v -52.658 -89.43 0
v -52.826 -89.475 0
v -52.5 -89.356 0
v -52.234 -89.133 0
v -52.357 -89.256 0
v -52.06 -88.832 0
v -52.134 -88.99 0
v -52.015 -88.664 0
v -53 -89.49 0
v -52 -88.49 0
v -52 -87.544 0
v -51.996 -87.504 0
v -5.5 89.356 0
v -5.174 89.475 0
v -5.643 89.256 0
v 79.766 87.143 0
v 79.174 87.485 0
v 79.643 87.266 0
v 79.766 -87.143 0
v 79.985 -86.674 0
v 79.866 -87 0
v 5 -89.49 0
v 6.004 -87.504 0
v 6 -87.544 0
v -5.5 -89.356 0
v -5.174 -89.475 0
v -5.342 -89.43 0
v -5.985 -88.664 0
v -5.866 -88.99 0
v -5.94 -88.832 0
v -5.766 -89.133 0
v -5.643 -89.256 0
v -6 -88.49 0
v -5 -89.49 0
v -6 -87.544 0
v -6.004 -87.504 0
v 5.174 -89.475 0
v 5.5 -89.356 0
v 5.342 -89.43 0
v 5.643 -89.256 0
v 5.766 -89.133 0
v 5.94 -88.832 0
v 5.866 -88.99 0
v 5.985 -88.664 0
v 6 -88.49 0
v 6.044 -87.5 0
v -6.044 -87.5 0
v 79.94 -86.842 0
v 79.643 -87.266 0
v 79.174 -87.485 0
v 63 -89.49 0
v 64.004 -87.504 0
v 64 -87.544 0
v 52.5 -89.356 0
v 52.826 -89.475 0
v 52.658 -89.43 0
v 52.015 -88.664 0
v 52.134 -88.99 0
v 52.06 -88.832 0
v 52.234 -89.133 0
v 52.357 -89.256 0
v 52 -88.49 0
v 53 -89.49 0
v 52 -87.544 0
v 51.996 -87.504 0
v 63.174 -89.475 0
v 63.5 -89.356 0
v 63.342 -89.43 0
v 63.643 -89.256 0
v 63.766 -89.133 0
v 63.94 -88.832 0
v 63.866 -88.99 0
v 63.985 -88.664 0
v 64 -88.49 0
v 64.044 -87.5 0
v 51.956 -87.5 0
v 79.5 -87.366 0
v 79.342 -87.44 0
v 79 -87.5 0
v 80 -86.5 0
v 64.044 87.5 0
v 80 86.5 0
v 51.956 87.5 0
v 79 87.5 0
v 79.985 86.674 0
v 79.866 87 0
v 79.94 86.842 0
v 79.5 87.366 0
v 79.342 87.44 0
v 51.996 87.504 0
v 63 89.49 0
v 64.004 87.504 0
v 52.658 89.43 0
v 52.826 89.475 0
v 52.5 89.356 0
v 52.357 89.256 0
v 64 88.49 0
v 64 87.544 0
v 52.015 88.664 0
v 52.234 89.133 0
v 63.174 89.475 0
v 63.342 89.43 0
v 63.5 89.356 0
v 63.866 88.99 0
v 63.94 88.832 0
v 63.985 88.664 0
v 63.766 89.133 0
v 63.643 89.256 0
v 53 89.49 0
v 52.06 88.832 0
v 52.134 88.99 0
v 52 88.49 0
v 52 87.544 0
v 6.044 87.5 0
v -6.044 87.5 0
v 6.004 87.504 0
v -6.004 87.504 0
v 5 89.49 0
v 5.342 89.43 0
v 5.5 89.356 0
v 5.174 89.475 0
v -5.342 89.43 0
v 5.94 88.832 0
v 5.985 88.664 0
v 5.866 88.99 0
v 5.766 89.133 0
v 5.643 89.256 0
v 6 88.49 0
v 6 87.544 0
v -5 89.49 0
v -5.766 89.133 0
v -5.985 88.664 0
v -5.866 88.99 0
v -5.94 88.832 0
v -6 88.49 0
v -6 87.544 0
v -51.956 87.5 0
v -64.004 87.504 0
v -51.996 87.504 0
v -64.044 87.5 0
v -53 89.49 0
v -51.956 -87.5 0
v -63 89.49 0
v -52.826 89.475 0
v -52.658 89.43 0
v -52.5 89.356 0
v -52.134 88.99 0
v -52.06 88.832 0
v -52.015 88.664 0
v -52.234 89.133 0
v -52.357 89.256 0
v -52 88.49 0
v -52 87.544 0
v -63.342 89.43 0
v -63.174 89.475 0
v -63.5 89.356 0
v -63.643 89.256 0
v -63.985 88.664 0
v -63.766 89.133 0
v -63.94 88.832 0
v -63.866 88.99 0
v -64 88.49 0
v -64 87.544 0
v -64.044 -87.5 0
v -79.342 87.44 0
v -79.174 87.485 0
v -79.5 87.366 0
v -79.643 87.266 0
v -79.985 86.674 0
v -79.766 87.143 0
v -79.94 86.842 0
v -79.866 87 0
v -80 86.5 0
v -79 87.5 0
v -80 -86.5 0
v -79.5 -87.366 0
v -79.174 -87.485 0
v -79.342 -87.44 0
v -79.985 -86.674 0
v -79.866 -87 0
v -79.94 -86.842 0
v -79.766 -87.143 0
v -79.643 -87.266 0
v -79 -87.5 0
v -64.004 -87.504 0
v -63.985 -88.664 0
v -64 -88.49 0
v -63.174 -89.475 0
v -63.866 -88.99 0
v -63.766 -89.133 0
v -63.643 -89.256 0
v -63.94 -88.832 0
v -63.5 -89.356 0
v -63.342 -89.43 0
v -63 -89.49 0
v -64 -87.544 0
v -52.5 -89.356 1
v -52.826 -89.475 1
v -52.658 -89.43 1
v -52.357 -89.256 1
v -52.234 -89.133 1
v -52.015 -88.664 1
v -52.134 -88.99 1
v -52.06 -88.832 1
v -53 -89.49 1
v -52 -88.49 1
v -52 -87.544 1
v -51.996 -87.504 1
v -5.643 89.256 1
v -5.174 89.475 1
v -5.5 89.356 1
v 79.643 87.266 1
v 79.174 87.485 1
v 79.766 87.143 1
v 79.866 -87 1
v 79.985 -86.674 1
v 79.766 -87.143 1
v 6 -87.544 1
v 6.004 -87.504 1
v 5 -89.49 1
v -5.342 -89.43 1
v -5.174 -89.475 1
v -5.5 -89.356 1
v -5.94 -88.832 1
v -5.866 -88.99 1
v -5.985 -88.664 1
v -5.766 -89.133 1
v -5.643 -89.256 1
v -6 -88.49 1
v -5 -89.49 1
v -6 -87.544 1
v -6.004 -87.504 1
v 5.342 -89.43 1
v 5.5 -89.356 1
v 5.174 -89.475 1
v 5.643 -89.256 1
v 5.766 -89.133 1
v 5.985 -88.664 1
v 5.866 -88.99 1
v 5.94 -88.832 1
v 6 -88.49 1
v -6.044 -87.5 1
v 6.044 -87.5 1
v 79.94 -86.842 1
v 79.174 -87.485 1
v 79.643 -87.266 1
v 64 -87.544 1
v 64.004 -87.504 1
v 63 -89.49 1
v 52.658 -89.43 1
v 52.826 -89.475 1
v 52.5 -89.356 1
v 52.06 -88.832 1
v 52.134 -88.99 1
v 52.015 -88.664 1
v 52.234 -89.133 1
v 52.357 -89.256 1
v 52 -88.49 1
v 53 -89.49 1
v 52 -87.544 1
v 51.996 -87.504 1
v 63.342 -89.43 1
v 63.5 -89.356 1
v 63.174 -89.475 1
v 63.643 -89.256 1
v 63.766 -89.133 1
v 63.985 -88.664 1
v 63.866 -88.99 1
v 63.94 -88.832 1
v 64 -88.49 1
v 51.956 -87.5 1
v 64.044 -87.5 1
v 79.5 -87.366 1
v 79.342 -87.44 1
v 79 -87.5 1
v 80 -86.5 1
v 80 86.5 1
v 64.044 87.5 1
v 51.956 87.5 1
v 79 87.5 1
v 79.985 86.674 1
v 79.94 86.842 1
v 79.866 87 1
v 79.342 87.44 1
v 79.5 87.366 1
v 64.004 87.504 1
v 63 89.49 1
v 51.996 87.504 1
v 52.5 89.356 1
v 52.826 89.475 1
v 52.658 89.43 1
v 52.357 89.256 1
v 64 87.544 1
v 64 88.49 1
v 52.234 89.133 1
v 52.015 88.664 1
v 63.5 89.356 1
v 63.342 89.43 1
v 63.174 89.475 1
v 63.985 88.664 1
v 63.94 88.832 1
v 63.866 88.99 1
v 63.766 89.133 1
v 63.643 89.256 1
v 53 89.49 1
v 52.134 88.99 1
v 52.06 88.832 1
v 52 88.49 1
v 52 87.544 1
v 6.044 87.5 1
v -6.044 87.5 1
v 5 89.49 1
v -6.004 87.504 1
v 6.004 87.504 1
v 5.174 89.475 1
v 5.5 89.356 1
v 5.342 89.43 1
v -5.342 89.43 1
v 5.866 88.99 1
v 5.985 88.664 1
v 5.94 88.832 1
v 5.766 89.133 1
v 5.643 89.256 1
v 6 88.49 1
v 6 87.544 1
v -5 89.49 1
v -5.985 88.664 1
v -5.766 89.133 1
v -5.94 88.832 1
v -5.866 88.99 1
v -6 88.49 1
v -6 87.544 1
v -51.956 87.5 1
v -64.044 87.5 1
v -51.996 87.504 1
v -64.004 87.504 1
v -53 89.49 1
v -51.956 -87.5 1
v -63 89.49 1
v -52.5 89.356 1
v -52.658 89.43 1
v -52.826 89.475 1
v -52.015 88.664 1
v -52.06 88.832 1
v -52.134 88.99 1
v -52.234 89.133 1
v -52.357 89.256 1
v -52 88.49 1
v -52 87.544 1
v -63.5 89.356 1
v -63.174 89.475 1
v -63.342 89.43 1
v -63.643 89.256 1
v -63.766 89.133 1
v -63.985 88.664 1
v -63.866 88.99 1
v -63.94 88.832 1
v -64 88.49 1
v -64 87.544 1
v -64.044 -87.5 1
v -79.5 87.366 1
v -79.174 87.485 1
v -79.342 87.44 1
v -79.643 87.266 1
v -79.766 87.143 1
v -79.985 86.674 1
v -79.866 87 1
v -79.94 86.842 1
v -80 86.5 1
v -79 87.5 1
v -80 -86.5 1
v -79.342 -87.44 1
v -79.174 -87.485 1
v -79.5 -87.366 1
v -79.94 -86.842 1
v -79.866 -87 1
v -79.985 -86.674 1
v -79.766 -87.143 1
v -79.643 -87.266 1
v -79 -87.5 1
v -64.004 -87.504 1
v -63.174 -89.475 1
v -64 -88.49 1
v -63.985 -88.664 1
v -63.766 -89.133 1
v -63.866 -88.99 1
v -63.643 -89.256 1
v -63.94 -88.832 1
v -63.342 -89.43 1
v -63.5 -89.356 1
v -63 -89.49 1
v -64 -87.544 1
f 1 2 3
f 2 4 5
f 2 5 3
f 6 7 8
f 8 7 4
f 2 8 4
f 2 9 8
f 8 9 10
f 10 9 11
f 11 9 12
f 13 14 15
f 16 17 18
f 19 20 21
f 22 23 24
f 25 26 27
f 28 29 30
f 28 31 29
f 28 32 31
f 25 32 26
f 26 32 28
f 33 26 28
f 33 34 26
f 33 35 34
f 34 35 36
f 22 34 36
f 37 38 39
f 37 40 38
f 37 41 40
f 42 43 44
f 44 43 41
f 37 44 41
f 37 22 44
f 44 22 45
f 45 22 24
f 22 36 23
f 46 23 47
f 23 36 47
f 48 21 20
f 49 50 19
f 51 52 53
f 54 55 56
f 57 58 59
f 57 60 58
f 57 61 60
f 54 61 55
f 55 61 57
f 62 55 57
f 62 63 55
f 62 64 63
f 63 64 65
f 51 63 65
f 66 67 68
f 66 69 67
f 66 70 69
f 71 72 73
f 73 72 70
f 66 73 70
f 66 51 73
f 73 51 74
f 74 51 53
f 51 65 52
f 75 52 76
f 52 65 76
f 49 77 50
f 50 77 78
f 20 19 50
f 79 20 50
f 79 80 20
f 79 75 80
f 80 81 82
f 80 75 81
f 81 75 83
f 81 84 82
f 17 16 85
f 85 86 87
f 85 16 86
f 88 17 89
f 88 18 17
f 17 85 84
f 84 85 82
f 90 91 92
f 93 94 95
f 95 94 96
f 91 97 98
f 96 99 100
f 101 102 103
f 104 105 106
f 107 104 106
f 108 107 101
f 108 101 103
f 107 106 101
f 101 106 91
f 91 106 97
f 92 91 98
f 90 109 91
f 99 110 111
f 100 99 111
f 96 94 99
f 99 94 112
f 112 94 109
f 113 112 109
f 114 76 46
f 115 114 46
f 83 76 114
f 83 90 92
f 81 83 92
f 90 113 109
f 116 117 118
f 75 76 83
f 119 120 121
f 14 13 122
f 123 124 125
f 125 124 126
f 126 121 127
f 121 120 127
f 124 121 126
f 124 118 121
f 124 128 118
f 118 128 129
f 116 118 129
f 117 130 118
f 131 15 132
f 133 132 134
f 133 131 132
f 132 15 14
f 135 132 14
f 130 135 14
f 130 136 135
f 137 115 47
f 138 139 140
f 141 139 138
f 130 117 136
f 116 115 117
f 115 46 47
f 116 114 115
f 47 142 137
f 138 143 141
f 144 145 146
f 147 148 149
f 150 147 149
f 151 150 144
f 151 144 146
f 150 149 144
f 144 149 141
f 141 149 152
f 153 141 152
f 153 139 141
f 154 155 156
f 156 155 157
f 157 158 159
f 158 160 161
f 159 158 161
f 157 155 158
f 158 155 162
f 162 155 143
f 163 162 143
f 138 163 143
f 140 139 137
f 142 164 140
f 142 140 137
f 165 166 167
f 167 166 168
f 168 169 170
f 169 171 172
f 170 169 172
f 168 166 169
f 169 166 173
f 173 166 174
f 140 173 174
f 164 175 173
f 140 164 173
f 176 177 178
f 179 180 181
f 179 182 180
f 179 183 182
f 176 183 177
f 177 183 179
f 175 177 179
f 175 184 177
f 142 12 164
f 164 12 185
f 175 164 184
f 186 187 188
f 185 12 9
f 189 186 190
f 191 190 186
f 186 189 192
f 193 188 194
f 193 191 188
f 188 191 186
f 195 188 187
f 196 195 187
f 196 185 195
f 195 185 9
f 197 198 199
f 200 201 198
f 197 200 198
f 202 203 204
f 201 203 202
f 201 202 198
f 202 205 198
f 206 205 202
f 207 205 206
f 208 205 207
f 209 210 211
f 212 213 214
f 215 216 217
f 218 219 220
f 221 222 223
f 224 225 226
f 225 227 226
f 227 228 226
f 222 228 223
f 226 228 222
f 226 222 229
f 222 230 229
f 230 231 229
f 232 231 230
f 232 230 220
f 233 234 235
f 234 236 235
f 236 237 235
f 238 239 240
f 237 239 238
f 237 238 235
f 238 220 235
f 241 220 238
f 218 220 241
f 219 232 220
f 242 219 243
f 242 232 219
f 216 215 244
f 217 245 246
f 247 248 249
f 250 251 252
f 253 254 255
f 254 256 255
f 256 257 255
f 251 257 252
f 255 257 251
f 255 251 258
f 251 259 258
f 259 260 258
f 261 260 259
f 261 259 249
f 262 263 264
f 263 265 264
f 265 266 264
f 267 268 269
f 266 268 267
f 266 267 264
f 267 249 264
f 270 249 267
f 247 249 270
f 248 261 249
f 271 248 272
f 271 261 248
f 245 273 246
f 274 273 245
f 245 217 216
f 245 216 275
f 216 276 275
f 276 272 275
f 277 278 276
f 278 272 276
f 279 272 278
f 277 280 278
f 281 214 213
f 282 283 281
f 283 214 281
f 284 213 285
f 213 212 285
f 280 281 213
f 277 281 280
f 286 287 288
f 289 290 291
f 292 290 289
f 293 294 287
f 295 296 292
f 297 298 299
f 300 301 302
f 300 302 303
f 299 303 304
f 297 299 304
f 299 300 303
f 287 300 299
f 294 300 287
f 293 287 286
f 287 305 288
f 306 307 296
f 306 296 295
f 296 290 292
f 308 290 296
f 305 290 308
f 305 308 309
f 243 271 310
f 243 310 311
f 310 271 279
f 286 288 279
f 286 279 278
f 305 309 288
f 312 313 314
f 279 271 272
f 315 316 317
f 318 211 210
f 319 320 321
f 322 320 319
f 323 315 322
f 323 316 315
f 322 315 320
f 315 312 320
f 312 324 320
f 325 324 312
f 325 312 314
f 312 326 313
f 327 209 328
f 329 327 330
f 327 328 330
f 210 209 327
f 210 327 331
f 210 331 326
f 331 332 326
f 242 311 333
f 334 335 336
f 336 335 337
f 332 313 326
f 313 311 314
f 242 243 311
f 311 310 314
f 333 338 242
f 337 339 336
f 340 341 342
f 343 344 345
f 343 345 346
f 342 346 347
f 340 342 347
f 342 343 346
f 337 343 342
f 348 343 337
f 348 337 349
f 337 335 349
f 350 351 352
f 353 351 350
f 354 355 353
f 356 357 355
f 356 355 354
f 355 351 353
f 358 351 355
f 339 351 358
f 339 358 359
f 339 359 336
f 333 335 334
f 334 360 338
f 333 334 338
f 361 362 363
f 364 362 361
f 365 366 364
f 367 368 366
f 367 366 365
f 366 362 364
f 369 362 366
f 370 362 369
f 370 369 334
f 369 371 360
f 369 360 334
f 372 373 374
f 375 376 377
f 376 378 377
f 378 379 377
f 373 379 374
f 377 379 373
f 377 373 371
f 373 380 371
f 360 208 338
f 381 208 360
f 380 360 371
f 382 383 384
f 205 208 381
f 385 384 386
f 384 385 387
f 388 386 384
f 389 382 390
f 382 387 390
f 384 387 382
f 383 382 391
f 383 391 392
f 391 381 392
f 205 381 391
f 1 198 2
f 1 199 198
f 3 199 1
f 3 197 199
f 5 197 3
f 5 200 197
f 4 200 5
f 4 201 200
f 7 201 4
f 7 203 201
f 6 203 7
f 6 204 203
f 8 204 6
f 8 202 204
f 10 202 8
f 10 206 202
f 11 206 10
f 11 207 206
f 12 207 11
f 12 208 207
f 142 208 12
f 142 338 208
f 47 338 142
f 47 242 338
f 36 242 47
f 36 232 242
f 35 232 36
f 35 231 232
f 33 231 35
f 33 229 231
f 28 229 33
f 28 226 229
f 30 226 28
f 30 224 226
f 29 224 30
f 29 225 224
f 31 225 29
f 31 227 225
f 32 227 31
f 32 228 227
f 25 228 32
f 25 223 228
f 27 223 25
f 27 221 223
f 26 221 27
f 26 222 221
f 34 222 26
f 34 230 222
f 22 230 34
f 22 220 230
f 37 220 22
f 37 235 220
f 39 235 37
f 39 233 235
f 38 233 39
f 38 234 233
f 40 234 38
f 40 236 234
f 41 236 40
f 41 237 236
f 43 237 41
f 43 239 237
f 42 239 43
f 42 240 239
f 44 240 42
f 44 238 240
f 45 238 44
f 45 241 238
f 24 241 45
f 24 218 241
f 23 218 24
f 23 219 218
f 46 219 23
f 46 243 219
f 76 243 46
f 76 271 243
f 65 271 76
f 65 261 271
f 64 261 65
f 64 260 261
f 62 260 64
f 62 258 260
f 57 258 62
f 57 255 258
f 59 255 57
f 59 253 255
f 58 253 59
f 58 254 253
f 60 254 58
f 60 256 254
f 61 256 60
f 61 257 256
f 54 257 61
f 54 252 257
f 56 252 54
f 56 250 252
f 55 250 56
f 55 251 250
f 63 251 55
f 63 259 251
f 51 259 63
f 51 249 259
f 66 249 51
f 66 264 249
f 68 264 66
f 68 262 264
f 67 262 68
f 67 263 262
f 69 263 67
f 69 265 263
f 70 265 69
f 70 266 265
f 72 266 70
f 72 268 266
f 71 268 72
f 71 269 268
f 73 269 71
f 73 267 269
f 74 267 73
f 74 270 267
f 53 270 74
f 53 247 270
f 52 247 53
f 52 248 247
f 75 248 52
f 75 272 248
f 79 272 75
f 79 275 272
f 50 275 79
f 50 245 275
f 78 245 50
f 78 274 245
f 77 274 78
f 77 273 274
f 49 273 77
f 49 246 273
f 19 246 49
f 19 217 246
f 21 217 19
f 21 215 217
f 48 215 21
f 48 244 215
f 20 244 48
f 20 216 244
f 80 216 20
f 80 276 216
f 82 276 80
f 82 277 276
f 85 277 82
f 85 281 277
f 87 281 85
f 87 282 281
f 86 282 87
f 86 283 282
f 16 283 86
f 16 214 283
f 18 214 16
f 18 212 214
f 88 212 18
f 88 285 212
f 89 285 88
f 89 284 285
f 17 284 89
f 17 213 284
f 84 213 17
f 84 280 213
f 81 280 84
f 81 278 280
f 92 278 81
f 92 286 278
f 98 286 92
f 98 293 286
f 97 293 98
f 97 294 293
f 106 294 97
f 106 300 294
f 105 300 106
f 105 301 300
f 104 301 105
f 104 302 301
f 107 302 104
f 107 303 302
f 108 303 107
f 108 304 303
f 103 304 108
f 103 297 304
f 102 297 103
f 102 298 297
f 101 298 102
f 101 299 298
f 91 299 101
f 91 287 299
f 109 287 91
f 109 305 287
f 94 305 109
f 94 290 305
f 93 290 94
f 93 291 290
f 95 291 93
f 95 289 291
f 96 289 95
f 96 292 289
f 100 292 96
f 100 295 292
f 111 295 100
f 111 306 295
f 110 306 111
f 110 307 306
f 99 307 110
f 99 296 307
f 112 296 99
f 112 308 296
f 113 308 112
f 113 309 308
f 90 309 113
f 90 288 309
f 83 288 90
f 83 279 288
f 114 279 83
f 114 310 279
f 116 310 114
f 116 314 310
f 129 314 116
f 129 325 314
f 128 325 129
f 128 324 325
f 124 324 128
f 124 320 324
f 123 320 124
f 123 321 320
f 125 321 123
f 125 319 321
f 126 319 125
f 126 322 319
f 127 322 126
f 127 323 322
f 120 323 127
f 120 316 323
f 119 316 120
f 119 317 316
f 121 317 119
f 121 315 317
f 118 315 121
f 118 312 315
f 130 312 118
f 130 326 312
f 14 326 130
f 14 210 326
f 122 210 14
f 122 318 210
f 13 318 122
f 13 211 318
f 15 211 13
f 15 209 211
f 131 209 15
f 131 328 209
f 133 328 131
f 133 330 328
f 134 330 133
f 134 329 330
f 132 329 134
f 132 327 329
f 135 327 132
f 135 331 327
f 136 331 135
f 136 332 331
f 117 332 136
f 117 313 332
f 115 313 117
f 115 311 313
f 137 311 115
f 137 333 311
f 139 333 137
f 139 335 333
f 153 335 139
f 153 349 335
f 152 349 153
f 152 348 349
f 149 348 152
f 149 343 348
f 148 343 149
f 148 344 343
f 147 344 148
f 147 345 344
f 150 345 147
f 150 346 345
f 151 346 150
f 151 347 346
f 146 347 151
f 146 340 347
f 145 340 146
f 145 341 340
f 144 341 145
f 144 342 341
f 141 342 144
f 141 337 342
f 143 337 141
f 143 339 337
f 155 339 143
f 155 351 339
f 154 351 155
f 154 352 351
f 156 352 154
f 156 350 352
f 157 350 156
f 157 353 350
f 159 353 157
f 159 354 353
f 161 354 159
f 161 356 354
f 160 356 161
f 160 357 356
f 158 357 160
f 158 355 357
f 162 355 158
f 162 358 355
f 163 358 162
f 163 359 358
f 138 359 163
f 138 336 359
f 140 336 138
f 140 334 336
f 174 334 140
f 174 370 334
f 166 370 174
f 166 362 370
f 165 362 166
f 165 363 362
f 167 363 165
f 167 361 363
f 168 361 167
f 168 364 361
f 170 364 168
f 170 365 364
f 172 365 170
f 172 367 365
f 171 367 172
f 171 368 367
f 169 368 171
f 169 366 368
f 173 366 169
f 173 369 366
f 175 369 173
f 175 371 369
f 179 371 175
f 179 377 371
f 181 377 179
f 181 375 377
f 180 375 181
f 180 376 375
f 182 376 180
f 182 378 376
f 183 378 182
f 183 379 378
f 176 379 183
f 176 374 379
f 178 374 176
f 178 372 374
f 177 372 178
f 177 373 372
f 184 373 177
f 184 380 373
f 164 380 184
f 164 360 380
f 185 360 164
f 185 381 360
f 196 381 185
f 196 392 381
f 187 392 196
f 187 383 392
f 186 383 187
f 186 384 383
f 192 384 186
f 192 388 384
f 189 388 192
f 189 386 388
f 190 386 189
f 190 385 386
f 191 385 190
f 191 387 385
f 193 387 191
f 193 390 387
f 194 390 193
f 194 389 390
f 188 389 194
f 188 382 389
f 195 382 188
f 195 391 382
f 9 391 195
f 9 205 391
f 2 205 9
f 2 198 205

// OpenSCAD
E = 0.01;

width = 160;
height = 175;
thickness = 1;

tab_width = 12;
tab_height = 2;
tab_gap = 52;

module shape_tab() {
    square([tab_width, tab_height], center = true);
}

module shape() {
    square([width, height], center = true);

    translate([0, tab_height / 2 + height / 2 - E]) {
        shape_tab();

        translate([tab_width / 2 + tab_gap, 0])
            shape_tab();

        translate([- tab_width / 2 - tab_gap, 0])
            shape_tab();
    }

    translate([0, - tab_height / 2 - height / 2 + E]) {
        shape_tab();

        translate([tab_width / 2 + tab_gap, 0])
            shape_tab();

        translate([- tab_width / 2 - tab_gap, 0])
            shape_tab();
    }
}

$fn = 36;

linear_extrude(thickness)
offset(1)
offset(-1)
    shape();
